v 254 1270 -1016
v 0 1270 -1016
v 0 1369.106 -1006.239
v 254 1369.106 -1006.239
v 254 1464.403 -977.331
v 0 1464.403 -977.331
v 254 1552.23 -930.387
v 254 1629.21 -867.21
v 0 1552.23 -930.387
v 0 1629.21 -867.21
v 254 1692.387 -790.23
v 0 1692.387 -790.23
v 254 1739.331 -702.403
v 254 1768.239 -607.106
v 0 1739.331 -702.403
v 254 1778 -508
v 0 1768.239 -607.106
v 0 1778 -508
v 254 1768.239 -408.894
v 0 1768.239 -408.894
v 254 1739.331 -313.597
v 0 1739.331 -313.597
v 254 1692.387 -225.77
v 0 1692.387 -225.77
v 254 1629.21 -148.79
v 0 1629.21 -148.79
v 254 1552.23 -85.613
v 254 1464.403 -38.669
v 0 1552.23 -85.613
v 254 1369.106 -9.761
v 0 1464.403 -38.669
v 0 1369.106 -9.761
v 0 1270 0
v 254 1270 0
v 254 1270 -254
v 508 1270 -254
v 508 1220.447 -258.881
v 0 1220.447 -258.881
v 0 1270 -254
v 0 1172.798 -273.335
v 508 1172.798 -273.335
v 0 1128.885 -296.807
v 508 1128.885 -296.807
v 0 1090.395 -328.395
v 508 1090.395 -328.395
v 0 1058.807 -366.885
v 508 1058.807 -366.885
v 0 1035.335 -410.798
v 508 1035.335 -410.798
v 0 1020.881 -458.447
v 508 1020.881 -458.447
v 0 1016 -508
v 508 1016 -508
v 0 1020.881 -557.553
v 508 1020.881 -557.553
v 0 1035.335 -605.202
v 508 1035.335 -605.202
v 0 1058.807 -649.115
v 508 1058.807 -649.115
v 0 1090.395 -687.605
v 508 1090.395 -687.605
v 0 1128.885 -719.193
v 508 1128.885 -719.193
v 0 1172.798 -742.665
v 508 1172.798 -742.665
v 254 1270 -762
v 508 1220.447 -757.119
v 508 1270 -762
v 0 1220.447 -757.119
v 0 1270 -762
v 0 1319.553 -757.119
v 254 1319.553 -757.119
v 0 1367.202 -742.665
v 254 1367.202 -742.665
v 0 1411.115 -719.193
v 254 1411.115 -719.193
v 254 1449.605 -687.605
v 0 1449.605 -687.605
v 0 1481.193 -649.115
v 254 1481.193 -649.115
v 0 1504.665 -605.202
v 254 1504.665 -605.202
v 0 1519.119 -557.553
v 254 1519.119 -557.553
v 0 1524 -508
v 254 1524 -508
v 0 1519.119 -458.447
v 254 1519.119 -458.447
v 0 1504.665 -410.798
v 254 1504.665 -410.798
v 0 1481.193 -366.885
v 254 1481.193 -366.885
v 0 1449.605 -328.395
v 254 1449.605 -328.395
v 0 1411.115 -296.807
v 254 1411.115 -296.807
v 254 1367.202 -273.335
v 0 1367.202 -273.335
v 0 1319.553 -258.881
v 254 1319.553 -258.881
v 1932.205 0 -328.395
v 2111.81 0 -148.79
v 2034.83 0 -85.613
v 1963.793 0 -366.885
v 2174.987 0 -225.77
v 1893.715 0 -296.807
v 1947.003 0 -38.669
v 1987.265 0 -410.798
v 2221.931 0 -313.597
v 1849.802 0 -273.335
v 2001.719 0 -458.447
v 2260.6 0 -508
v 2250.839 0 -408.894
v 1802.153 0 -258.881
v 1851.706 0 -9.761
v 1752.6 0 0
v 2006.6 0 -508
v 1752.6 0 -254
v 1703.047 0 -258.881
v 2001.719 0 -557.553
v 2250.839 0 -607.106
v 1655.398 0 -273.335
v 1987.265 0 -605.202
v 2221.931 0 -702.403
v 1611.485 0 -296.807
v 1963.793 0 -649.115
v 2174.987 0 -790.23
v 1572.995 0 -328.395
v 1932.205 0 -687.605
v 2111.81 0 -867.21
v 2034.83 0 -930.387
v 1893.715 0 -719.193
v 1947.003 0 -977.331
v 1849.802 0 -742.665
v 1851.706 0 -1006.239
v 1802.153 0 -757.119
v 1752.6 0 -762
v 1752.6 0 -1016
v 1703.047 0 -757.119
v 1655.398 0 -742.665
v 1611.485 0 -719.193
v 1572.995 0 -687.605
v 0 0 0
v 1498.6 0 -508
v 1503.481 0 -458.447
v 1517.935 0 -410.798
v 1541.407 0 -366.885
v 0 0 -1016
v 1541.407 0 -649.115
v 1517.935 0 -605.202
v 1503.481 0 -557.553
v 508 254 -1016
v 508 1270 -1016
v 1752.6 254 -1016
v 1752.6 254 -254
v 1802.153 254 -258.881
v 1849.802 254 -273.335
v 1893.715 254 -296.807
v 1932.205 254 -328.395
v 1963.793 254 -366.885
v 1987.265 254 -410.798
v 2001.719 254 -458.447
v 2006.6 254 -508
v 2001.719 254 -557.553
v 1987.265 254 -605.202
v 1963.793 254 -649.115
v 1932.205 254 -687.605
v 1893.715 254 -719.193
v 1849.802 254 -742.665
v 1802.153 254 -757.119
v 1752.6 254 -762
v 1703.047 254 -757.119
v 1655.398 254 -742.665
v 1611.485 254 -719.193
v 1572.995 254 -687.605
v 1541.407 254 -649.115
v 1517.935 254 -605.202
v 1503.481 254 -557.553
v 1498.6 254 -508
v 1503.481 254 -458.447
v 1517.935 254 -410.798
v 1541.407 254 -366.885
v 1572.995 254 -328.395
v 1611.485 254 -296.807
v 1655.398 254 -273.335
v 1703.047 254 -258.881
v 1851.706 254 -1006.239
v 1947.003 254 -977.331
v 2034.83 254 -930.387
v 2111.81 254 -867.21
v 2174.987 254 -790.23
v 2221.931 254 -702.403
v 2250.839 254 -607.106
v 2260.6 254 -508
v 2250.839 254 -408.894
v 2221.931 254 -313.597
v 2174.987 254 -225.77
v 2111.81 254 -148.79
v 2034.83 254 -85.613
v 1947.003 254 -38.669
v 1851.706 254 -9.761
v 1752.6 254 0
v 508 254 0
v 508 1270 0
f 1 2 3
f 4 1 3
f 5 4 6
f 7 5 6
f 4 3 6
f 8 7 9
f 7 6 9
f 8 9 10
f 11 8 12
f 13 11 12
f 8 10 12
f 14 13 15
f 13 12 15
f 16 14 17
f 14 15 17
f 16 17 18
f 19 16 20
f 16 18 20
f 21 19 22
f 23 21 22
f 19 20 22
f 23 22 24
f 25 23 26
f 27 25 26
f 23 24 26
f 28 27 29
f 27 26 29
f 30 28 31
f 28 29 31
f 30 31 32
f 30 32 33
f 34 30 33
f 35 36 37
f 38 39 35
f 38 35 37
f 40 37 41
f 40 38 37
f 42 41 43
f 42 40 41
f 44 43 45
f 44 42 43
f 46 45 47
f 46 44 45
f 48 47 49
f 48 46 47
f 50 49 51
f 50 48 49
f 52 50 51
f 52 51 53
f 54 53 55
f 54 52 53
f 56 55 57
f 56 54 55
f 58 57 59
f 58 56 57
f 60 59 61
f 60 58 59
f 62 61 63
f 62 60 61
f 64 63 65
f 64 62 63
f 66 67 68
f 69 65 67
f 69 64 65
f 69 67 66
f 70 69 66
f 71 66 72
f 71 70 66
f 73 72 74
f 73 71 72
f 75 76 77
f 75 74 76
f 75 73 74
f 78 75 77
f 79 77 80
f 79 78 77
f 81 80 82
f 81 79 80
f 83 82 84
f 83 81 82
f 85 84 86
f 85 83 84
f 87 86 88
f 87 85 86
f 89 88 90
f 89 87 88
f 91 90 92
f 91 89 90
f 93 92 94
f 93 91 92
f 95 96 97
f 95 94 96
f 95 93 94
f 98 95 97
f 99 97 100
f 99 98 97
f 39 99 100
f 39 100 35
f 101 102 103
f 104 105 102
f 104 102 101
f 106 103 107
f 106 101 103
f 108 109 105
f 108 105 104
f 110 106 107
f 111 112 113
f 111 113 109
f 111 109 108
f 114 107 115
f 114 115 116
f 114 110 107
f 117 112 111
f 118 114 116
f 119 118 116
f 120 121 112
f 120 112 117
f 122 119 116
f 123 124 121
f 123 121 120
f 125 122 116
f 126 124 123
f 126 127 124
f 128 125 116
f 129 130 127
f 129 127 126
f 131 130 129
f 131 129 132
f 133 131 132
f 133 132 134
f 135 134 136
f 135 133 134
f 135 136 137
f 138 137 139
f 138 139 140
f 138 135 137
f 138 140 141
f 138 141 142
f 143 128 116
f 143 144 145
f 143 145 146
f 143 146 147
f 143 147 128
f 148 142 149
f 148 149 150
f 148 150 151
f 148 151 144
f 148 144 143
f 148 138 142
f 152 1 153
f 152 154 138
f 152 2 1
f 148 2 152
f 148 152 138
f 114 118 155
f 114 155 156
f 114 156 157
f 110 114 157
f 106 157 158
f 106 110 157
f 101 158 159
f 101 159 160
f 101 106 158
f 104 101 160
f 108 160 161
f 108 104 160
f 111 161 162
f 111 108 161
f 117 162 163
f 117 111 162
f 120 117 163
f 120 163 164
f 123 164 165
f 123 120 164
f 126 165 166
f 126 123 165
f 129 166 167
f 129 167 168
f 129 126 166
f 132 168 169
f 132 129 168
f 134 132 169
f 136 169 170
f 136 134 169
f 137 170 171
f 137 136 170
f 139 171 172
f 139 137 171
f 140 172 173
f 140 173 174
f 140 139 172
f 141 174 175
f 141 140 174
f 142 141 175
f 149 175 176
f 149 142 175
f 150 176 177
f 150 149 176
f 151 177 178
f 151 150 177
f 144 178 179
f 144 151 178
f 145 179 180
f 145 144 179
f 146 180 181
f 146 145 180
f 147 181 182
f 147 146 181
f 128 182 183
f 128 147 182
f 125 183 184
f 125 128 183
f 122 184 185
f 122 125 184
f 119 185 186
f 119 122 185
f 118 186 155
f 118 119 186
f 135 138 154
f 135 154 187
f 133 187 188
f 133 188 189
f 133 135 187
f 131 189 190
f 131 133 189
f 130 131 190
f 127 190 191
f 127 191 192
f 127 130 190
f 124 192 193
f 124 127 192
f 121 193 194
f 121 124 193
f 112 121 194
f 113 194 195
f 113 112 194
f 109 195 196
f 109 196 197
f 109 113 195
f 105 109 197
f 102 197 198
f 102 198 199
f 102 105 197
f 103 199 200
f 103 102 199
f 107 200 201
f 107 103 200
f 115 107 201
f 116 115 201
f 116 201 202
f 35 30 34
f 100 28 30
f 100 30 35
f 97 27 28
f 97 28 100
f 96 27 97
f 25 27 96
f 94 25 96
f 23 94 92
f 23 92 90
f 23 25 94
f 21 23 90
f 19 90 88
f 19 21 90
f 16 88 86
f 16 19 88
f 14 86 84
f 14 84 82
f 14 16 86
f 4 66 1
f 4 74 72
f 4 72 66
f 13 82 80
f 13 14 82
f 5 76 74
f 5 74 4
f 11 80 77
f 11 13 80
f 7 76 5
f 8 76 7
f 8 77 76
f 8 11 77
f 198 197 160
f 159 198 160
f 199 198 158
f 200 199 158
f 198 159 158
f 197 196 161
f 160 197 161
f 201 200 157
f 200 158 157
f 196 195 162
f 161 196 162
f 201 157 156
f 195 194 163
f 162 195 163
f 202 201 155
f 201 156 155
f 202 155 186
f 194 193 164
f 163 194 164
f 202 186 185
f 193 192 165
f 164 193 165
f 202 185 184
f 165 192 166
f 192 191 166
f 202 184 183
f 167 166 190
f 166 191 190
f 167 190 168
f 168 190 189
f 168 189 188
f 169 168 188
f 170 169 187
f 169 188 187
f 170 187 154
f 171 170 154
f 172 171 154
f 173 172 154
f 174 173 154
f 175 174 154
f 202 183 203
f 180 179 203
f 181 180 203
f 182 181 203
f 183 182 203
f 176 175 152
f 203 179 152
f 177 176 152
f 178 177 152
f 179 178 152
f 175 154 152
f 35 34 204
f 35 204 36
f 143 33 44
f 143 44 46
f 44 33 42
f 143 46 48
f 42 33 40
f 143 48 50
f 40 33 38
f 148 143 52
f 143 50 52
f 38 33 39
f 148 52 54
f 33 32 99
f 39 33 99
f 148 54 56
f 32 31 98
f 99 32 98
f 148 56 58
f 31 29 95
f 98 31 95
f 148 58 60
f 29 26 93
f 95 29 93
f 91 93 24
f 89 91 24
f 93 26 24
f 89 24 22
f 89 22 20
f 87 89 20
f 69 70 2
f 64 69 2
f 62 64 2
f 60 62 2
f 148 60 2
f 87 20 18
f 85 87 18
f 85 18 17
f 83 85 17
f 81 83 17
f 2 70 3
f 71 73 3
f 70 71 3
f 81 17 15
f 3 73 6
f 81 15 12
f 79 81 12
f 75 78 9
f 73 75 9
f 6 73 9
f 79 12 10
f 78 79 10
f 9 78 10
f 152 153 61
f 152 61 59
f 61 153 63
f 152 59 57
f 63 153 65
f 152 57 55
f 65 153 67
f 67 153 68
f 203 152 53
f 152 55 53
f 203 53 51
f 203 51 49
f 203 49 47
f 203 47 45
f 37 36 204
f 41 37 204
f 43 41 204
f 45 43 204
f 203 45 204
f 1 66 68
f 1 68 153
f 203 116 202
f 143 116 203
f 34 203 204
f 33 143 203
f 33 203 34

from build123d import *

# Parameters (mm, degrees)
SKETCH1_R           = 254
BOSS_EXTRUDE1_DEPTH = 254
SKETCH3_R           = 254
BOSS_EXTRUDE2_DEPTH = 254
BOSS_EXTRUDE3_DEPTH = 254


with BuildPart() as part:
    # Sketch1 → Boss-Extrude1 (new body)
    with BuildSketch(Plane(origin=(0, 0, 0), x_dir=(1, 0, 0), z_dir=(0, 1, 0))):
        with BuildLine():
            Line((0, 0), (0, 1016))
            Line((0, 1016), (1752.6, 1016))
            ThreePointArc((1752.6, 1016), (2260.6, 508), (1752.6, 0))
            Line((1752.6, 0), (0, 0))
        make_face()
        with Locations(Location((1752.6, 508, 0), (0, 0, 270))):
            Circle(SKETCH1_R, mode=Mode.SUBTRACT)
    extrude(amount=BOSS_EXTRUDE1_DEPTH)

    # Sketch3 → Boss-Extrude2 (add)
    with BuildSketch(Plane.ZY):
        with BuildLine():
            ThreePointArc((-1016, 1270), (-508, 1778), (0, 1270))
            Line((0, 1270), (0, 254))
            Line((0, 254), (-1016, 254))
            Line((-1016, 254), (-1016, 1270))
        make_face()
        with Locations((-508, 1270)):
            Circle(SKETCH3_R, mode=Mode.SUBTRACT)
    extrude(amount=-BOSS_EXTRUDE2_DEPTH)

    # Sketch4 → Boss-Extrude3 (add)
    with BuildSketch(Plane(origin=(254, 0, 0), x_dir=(0, 0, -1), z_dir=(1, 0, 0))):
        with BuildLine():
            Line((0, 1270), (254, 1270))
            ThreePointArc((254, 1270), (508, 1016), (762, 1270))
            Line((762, 1270), (1016, 1270))
            Line((1016, 1270), (1016, 254))
            Line((1016, 254), (0, 254))
            Line((0, 254), (0, 1270))
        make_face()
    extrude(amount=BOSS_EXTRUDE3_DEPTH)


solid = part.part
